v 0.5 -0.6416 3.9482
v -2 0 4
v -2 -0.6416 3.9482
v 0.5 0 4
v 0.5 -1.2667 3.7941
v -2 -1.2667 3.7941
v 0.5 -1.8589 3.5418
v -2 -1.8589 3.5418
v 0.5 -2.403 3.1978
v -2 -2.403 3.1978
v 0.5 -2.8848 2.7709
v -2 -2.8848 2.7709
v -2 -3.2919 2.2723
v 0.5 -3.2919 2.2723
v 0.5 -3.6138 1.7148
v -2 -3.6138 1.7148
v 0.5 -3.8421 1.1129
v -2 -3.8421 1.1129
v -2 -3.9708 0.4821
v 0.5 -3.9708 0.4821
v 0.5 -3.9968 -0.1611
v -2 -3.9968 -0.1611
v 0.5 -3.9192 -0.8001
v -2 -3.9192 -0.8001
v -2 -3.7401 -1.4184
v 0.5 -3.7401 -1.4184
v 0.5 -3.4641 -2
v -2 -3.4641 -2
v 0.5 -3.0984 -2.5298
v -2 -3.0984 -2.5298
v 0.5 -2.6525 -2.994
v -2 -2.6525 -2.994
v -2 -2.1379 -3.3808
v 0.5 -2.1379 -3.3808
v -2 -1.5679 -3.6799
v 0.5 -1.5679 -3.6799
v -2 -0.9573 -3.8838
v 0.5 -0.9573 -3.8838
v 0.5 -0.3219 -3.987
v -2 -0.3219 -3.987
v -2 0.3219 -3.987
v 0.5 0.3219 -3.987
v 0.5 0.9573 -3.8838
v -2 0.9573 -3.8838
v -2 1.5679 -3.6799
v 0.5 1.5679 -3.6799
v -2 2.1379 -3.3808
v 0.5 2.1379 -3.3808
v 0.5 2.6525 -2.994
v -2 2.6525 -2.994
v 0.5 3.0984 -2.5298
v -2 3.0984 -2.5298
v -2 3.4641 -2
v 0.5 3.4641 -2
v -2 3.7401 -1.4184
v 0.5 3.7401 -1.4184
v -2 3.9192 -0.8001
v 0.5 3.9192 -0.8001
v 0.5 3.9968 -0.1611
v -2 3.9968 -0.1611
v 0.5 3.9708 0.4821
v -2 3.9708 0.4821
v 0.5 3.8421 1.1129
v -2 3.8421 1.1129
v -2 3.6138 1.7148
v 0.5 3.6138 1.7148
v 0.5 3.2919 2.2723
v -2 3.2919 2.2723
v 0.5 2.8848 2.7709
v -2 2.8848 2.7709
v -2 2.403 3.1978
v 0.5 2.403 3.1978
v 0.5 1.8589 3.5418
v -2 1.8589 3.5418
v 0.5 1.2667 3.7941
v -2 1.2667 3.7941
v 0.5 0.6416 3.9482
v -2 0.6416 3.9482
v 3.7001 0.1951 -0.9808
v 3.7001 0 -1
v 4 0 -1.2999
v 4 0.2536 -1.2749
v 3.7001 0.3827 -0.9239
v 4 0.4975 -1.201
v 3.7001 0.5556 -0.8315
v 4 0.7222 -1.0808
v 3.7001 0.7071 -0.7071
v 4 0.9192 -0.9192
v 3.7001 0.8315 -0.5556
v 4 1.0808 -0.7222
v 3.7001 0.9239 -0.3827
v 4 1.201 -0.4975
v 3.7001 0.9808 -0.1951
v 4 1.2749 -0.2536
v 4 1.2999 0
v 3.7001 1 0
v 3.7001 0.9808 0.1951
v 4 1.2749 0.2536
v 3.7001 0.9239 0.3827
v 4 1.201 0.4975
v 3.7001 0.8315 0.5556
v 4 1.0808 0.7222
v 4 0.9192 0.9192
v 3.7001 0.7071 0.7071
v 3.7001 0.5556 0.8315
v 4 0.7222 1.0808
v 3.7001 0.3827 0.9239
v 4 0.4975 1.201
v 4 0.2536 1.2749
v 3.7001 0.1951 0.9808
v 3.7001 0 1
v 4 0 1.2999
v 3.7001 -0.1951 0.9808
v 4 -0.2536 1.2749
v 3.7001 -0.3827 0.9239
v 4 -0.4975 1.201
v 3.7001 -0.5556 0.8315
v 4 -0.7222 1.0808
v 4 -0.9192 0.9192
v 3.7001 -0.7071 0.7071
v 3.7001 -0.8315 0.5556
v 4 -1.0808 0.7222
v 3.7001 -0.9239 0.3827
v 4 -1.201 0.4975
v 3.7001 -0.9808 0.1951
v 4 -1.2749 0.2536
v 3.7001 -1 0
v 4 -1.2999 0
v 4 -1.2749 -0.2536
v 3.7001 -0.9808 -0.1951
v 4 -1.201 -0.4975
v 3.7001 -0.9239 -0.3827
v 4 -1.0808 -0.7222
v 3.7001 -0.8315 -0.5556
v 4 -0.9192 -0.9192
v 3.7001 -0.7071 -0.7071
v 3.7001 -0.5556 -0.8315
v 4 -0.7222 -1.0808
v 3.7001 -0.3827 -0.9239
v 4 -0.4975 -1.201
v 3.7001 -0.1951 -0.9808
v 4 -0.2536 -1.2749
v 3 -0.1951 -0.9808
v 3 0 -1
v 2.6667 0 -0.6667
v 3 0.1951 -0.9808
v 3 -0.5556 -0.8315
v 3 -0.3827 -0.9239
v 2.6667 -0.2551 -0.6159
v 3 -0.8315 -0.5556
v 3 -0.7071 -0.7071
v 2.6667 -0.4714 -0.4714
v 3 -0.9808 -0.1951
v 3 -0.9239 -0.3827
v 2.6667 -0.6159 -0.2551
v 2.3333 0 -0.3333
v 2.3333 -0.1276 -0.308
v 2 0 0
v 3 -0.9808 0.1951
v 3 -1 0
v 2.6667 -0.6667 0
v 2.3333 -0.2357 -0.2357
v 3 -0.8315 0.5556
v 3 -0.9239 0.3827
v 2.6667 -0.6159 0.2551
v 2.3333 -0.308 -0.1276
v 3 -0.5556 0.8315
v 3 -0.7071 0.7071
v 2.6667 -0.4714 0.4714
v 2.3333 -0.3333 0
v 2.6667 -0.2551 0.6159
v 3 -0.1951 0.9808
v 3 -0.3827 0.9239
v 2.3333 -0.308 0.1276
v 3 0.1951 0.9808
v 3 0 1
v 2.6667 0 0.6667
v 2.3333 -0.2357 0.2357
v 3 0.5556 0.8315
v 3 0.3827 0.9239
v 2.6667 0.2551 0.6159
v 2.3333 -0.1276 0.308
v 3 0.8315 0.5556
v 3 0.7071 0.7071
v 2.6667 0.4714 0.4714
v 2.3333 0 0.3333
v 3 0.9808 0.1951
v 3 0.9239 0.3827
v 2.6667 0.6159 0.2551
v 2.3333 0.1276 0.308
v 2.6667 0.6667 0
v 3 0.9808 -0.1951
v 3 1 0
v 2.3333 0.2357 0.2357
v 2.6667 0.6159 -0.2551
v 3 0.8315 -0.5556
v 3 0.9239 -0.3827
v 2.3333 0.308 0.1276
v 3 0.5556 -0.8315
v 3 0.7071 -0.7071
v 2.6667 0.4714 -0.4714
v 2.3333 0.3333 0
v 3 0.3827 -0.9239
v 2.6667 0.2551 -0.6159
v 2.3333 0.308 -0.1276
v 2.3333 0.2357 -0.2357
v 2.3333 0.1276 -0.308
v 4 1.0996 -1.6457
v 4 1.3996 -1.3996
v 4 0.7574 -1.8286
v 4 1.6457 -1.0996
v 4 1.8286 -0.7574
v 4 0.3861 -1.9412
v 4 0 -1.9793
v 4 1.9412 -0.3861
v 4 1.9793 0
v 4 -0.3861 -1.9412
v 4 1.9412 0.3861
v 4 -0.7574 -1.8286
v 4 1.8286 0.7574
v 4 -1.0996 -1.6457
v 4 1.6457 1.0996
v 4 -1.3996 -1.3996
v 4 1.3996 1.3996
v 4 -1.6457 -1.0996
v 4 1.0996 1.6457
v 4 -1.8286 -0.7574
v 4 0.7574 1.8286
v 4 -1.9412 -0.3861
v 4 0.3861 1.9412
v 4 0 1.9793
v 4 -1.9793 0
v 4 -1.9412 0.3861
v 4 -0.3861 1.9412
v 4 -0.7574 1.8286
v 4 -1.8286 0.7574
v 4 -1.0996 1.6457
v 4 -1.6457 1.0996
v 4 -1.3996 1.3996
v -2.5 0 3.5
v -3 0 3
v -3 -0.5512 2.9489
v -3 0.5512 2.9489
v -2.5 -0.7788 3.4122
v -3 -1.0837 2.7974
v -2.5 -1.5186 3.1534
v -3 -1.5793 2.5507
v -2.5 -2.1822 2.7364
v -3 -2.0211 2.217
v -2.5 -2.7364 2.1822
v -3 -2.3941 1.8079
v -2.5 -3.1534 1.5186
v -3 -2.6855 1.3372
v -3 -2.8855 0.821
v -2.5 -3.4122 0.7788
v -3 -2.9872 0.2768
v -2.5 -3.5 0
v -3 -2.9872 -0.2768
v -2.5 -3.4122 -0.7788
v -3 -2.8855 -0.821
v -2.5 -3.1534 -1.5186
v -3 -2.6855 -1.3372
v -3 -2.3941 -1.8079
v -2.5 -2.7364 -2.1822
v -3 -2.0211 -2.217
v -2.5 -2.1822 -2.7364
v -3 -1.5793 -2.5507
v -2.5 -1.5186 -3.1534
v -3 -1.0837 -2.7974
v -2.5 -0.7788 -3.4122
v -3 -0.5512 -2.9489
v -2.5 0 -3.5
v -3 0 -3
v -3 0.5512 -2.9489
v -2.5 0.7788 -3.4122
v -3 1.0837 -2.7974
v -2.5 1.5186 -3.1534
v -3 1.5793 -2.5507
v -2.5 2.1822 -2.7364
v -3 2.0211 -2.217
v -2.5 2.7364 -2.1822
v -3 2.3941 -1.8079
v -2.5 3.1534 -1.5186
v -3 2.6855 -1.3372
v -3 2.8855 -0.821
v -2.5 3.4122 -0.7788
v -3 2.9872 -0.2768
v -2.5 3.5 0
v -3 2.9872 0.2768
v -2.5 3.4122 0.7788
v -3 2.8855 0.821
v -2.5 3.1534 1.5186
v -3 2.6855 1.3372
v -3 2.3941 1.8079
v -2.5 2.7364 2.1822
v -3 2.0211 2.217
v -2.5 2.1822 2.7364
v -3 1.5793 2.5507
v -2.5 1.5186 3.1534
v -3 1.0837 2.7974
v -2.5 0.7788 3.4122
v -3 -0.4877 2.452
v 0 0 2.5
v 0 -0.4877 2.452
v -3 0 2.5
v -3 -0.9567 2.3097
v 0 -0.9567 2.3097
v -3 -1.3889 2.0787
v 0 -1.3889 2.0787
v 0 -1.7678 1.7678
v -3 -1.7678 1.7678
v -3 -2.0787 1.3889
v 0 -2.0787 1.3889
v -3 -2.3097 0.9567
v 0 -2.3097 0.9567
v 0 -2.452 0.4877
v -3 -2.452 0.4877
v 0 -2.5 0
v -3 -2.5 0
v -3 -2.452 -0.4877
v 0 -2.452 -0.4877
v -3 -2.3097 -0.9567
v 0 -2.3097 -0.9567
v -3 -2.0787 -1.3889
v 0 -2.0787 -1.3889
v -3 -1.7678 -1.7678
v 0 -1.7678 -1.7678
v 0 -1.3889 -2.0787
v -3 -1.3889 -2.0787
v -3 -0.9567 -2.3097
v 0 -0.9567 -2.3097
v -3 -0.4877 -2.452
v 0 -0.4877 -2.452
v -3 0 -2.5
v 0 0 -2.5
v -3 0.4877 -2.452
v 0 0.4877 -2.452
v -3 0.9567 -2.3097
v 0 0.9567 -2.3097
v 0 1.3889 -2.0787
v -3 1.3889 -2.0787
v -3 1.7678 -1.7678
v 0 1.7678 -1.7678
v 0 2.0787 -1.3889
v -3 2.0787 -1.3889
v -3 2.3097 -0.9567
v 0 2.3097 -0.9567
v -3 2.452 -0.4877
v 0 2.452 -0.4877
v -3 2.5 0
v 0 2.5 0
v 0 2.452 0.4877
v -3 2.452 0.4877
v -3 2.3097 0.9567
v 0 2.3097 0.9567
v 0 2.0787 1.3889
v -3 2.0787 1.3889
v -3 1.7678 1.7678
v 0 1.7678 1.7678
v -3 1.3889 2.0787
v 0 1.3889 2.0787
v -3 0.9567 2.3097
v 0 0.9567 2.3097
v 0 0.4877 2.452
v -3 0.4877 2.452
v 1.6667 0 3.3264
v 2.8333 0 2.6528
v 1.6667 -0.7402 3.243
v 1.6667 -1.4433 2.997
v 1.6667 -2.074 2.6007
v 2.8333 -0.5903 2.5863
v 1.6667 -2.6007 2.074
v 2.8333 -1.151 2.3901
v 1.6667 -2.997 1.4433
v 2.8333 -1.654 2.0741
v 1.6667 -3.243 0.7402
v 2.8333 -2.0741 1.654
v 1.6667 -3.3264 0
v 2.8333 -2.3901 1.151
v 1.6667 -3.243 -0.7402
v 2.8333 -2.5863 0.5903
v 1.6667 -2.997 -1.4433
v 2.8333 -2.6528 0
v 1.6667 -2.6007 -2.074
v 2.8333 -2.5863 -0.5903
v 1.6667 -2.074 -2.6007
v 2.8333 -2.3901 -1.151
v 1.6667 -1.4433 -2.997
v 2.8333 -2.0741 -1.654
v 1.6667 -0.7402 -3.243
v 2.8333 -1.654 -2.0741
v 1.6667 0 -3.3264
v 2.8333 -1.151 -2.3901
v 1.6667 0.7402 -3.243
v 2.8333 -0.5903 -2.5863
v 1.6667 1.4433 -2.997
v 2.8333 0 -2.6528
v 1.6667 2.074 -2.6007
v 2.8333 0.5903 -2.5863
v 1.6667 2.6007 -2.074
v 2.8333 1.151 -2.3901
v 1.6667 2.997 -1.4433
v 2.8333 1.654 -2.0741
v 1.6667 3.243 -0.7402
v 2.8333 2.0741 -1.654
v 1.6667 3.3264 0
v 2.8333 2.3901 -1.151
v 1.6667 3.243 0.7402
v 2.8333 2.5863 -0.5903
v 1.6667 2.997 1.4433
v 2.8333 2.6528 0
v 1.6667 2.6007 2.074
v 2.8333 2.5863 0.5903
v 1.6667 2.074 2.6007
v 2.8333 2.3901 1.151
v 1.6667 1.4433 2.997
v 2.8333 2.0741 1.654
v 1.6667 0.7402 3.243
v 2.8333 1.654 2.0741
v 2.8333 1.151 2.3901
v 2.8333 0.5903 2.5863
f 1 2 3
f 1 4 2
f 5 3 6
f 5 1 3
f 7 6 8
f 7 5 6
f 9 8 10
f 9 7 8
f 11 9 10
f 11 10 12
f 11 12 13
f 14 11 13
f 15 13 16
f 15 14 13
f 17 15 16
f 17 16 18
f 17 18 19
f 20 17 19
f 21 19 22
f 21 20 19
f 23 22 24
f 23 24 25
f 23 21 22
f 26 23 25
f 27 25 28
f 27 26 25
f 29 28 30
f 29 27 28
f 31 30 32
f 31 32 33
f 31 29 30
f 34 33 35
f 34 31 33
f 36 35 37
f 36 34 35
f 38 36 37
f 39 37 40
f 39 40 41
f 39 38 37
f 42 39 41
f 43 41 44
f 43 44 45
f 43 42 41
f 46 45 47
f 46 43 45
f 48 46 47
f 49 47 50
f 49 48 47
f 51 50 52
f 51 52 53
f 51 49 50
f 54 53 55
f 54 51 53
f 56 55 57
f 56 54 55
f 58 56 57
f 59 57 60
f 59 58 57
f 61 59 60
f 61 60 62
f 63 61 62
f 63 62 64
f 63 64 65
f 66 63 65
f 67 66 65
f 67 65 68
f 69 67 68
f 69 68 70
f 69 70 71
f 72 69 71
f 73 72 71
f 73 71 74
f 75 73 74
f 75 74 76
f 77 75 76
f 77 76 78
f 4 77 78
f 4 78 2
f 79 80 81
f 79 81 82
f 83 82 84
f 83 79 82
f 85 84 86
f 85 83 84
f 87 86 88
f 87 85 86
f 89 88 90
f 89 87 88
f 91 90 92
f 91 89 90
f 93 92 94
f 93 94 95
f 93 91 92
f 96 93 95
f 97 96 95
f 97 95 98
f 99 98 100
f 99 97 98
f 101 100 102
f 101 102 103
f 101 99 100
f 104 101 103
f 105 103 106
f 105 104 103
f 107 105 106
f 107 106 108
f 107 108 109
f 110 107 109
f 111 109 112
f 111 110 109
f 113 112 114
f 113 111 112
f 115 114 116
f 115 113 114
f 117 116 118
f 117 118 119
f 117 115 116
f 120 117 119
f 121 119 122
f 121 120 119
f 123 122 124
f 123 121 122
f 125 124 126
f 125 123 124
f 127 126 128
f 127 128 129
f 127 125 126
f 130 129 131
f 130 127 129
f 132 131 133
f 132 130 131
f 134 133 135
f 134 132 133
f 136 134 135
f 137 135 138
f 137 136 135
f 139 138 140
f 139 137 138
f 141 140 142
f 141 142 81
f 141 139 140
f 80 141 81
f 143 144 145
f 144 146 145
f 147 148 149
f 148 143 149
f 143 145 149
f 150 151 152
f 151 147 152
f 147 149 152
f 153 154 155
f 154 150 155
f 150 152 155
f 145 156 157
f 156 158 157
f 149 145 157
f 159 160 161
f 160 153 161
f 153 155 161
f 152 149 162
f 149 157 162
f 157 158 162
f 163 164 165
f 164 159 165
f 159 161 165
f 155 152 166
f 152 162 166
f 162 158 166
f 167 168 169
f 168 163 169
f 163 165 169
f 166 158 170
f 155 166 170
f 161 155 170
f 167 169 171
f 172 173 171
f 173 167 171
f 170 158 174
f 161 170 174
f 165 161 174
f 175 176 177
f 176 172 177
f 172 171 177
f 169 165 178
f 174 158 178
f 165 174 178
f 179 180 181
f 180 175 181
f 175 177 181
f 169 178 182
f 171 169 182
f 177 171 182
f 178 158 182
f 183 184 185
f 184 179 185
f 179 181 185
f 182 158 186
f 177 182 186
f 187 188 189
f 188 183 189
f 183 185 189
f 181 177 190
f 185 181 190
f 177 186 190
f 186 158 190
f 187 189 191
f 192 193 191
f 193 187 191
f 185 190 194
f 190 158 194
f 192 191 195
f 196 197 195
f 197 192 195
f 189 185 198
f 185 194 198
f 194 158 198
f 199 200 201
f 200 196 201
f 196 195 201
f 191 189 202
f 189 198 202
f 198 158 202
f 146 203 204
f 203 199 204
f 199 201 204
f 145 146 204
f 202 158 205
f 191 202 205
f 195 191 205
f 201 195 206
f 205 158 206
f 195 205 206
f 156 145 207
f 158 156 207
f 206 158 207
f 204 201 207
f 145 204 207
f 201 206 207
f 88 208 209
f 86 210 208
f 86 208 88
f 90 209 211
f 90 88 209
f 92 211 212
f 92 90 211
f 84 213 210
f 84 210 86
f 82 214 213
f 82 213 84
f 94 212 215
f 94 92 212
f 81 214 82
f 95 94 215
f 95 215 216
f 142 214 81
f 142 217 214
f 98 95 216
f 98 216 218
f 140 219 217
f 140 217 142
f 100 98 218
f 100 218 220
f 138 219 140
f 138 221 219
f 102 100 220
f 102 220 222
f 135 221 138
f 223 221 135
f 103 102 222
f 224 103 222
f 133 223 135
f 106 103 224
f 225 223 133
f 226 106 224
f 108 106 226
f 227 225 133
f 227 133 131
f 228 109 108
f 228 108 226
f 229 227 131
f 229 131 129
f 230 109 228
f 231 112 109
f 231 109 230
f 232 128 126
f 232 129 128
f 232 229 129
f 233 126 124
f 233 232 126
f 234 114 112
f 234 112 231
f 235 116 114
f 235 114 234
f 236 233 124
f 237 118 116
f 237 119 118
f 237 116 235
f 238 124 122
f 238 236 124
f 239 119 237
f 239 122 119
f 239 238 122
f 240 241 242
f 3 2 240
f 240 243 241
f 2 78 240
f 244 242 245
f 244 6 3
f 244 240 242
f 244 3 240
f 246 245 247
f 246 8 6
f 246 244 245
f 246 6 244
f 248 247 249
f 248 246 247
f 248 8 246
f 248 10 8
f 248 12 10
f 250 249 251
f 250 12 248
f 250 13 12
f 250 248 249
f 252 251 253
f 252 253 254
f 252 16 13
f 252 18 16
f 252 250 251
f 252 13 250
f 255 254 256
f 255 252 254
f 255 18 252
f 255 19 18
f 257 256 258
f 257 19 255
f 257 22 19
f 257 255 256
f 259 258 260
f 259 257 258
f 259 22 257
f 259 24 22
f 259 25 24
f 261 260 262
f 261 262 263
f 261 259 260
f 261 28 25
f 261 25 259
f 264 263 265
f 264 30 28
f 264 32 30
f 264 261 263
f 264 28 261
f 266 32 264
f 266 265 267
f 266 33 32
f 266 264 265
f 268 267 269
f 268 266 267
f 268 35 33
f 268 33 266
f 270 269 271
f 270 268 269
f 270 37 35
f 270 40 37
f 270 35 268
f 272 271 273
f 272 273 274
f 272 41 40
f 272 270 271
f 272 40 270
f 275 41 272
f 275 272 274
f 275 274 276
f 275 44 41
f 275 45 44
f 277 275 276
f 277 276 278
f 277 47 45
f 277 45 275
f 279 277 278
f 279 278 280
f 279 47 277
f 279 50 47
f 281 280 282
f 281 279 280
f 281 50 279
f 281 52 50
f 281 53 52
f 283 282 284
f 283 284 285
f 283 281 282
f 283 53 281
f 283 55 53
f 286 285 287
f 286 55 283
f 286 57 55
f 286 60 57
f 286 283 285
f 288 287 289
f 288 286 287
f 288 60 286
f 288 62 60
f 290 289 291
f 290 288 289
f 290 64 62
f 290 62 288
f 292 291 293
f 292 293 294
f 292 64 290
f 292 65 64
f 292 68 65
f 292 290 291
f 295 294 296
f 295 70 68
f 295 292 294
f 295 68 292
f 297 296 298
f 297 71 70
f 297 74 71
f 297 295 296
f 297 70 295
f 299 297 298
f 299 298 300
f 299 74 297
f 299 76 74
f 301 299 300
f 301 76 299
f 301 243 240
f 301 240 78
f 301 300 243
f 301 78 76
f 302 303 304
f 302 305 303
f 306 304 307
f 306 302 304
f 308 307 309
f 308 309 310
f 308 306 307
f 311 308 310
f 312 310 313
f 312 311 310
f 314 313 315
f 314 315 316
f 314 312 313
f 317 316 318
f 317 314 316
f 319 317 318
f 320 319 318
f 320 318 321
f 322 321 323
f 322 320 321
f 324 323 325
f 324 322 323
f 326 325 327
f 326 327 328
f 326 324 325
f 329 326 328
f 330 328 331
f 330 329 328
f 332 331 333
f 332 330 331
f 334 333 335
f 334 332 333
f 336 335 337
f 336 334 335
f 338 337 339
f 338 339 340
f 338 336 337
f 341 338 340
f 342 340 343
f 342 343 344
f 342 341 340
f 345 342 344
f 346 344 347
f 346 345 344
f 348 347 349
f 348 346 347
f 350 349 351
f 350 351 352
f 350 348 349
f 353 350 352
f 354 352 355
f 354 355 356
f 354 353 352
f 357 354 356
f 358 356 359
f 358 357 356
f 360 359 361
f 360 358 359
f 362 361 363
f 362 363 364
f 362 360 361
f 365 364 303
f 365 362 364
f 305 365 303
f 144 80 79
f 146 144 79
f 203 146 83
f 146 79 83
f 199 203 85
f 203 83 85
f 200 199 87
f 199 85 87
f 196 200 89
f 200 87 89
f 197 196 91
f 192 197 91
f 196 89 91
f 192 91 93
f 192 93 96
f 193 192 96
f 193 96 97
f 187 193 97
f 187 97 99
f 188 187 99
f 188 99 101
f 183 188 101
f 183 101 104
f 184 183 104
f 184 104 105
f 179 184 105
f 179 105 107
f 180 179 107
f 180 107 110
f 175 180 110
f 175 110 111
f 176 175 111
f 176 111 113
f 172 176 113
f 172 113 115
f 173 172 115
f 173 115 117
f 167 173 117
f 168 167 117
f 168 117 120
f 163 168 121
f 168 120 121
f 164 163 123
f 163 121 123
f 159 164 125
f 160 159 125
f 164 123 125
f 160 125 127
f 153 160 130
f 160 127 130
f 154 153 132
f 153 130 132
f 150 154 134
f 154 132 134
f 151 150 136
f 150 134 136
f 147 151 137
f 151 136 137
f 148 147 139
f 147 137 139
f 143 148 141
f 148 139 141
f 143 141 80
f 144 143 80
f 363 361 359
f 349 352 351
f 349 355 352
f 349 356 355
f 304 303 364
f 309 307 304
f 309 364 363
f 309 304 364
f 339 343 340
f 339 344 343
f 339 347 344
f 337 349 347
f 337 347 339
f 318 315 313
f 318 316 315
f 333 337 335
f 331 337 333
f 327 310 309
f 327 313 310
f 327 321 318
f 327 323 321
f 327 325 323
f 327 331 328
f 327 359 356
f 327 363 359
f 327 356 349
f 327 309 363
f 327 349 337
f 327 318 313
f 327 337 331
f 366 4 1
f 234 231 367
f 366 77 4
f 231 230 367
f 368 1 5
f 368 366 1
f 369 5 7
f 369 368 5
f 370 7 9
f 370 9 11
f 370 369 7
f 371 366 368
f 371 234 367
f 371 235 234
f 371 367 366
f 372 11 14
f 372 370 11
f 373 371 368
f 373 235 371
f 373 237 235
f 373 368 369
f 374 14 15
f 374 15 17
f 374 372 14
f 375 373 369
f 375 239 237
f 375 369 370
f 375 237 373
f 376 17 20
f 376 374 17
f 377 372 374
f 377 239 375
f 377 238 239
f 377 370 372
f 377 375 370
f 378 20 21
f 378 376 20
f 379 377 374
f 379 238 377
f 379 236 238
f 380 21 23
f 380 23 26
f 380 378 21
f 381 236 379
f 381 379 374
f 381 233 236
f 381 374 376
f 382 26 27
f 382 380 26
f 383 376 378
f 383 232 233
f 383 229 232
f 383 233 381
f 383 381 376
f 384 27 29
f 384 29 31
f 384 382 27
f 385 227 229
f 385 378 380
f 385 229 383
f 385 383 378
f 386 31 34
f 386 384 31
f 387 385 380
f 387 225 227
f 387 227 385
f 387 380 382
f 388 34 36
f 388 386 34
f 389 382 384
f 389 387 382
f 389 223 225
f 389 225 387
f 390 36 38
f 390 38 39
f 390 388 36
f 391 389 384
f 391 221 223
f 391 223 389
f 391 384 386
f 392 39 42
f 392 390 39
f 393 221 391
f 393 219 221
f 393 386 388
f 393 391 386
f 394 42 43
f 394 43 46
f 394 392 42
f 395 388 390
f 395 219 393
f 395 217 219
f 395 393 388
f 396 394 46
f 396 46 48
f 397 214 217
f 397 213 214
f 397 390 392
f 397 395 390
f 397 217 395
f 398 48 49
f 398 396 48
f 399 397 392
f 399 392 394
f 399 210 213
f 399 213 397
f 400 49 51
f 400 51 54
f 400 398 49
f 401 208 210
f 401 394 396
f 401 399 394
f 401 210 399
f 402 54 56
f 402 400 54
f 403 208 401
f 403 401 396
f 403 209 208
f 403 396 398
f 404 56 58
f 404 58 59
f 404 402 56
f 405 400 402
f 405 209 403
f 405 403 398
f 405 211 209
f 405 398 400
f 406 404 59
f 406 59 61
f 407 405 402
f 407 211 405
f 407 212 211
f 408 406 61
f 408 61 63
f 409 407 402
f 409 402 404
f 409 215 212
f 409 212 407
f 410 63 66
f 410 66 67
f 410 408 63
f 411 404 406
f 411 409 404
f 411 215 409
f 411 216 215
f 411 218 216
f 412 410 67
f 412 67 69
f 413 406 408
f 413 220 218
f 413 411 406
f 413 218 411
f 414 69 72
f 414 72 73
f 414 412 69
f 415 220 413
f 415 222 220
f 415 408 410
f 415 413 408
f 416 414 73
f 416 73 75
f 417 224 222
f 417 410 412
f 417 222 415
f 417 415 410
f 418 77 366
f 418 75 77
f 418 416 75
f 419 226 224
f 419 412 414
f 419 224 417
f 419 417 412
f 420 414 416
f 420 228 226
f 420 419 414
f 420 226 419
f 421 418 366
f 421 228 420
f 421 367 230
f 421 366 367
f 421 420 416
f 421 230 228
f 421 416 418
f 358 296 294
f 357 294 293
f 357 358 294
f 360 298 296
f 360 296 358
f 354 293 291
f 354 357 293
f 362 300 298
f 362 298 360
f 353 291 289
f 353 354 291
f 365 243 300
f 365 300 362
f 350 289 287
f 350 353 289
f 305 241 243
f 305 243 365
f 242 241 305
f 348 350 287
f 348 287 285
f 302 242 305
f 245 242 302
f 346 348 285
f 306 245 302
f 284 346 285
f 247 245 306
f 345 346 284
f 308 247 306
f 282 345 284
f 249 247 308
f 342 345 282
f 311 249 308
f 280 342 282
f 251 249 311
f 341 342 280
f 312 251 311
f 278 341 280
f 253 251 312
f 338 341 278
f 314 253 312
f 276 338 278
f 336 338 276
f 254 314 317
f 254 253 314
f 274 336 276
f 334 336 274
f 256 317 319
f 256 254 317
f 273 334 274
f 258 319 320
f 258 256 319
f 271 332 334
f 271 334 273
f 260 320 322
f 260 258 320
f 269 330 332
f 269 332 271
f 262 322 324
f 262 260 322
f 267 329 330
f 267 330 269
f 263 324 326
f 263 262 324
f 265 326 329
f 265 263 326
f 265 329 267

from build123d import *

# Parameters (mm, degrees)
SKETCH2_R          = 1
CUT_EXTRUDE1_DEPTH = 0.3
CHAMFER1_SIZE      = 0.3
SKETCH3_R          = 1
CUT_EXTRUDE2_DEPTH = 0.7


with BuildPart() as part:
    # Sketch1 → Revolve1 (revolve)
    with BuildSketch(Plane(origin=(0, 0, 0), x_dir=(1, 0, 0), z_dir=(0, 1, 0)), mode=Mode.PRIVATE) as revolve1_sk:
        Polygon((0, 0), (0, 2.5), (-3, 2.5), (-3, 3), (-2, 4), (0.5, 4), (4, 1.979274058), (4, 0), align=None)
    revolve(revolve1_sk.sketch.rotate(Axis((-1.085106383, 0, 0), (1, 0, 0)), 180), axis=Axis((-1.085106383, 0, 0), (1, 0, 0)))

    # Sketch2 → Cut-Extrude1 (cut)
    with BuildSketch(Plane(origin=(4, 0, 0), x_dir=(0, 0, -1), z_dir=(1, 0, 0))):
        Circle(SKETCH2_R)
    extrude(amount=-CUT_EXTRUDE1_DEPTH, mode=Mode.SUBTRACT)

    # Chamfer1
    chamfer1_edges = [part.edges().sort_by_distance(p)[0] for p in [
        (4, 0, 1),
    ]]
    chamfer(chamfer1_edges, length=CHAMFER1_SIZE - 0.0001)  # a hair under: the kernel refuses the full size

    # Sketch3 → Cut-Extrude2 (cut)
    with BuildSketch(Plane(origin=(3.7, 0, 0), x_dir=(0, 0, -1), z_dir=(1, 0, 0))):
        Circle(SKETCH3_R)
    extrude(amount=-CUT_EXTRUDE2_DEPTH, mode=Mode.SUBTRACT)

    # Cut-Extrude3 cone 1 section (through the dimple's axis) → Cut-Extrude3 (revolve, cut)
    with BuildSketch(Plane(origin=(3, 0, 0), x_dir=(0, 0, -1), z_dir=(0, 1, 0))):
        Polygon((0, 0), (1, 0), (0, 1), align=None)
    revolve(axis=Axis((3, 0, 0), (-1, 0, 0)), mode=Mode.SUBTRACT)


solid = part.part
